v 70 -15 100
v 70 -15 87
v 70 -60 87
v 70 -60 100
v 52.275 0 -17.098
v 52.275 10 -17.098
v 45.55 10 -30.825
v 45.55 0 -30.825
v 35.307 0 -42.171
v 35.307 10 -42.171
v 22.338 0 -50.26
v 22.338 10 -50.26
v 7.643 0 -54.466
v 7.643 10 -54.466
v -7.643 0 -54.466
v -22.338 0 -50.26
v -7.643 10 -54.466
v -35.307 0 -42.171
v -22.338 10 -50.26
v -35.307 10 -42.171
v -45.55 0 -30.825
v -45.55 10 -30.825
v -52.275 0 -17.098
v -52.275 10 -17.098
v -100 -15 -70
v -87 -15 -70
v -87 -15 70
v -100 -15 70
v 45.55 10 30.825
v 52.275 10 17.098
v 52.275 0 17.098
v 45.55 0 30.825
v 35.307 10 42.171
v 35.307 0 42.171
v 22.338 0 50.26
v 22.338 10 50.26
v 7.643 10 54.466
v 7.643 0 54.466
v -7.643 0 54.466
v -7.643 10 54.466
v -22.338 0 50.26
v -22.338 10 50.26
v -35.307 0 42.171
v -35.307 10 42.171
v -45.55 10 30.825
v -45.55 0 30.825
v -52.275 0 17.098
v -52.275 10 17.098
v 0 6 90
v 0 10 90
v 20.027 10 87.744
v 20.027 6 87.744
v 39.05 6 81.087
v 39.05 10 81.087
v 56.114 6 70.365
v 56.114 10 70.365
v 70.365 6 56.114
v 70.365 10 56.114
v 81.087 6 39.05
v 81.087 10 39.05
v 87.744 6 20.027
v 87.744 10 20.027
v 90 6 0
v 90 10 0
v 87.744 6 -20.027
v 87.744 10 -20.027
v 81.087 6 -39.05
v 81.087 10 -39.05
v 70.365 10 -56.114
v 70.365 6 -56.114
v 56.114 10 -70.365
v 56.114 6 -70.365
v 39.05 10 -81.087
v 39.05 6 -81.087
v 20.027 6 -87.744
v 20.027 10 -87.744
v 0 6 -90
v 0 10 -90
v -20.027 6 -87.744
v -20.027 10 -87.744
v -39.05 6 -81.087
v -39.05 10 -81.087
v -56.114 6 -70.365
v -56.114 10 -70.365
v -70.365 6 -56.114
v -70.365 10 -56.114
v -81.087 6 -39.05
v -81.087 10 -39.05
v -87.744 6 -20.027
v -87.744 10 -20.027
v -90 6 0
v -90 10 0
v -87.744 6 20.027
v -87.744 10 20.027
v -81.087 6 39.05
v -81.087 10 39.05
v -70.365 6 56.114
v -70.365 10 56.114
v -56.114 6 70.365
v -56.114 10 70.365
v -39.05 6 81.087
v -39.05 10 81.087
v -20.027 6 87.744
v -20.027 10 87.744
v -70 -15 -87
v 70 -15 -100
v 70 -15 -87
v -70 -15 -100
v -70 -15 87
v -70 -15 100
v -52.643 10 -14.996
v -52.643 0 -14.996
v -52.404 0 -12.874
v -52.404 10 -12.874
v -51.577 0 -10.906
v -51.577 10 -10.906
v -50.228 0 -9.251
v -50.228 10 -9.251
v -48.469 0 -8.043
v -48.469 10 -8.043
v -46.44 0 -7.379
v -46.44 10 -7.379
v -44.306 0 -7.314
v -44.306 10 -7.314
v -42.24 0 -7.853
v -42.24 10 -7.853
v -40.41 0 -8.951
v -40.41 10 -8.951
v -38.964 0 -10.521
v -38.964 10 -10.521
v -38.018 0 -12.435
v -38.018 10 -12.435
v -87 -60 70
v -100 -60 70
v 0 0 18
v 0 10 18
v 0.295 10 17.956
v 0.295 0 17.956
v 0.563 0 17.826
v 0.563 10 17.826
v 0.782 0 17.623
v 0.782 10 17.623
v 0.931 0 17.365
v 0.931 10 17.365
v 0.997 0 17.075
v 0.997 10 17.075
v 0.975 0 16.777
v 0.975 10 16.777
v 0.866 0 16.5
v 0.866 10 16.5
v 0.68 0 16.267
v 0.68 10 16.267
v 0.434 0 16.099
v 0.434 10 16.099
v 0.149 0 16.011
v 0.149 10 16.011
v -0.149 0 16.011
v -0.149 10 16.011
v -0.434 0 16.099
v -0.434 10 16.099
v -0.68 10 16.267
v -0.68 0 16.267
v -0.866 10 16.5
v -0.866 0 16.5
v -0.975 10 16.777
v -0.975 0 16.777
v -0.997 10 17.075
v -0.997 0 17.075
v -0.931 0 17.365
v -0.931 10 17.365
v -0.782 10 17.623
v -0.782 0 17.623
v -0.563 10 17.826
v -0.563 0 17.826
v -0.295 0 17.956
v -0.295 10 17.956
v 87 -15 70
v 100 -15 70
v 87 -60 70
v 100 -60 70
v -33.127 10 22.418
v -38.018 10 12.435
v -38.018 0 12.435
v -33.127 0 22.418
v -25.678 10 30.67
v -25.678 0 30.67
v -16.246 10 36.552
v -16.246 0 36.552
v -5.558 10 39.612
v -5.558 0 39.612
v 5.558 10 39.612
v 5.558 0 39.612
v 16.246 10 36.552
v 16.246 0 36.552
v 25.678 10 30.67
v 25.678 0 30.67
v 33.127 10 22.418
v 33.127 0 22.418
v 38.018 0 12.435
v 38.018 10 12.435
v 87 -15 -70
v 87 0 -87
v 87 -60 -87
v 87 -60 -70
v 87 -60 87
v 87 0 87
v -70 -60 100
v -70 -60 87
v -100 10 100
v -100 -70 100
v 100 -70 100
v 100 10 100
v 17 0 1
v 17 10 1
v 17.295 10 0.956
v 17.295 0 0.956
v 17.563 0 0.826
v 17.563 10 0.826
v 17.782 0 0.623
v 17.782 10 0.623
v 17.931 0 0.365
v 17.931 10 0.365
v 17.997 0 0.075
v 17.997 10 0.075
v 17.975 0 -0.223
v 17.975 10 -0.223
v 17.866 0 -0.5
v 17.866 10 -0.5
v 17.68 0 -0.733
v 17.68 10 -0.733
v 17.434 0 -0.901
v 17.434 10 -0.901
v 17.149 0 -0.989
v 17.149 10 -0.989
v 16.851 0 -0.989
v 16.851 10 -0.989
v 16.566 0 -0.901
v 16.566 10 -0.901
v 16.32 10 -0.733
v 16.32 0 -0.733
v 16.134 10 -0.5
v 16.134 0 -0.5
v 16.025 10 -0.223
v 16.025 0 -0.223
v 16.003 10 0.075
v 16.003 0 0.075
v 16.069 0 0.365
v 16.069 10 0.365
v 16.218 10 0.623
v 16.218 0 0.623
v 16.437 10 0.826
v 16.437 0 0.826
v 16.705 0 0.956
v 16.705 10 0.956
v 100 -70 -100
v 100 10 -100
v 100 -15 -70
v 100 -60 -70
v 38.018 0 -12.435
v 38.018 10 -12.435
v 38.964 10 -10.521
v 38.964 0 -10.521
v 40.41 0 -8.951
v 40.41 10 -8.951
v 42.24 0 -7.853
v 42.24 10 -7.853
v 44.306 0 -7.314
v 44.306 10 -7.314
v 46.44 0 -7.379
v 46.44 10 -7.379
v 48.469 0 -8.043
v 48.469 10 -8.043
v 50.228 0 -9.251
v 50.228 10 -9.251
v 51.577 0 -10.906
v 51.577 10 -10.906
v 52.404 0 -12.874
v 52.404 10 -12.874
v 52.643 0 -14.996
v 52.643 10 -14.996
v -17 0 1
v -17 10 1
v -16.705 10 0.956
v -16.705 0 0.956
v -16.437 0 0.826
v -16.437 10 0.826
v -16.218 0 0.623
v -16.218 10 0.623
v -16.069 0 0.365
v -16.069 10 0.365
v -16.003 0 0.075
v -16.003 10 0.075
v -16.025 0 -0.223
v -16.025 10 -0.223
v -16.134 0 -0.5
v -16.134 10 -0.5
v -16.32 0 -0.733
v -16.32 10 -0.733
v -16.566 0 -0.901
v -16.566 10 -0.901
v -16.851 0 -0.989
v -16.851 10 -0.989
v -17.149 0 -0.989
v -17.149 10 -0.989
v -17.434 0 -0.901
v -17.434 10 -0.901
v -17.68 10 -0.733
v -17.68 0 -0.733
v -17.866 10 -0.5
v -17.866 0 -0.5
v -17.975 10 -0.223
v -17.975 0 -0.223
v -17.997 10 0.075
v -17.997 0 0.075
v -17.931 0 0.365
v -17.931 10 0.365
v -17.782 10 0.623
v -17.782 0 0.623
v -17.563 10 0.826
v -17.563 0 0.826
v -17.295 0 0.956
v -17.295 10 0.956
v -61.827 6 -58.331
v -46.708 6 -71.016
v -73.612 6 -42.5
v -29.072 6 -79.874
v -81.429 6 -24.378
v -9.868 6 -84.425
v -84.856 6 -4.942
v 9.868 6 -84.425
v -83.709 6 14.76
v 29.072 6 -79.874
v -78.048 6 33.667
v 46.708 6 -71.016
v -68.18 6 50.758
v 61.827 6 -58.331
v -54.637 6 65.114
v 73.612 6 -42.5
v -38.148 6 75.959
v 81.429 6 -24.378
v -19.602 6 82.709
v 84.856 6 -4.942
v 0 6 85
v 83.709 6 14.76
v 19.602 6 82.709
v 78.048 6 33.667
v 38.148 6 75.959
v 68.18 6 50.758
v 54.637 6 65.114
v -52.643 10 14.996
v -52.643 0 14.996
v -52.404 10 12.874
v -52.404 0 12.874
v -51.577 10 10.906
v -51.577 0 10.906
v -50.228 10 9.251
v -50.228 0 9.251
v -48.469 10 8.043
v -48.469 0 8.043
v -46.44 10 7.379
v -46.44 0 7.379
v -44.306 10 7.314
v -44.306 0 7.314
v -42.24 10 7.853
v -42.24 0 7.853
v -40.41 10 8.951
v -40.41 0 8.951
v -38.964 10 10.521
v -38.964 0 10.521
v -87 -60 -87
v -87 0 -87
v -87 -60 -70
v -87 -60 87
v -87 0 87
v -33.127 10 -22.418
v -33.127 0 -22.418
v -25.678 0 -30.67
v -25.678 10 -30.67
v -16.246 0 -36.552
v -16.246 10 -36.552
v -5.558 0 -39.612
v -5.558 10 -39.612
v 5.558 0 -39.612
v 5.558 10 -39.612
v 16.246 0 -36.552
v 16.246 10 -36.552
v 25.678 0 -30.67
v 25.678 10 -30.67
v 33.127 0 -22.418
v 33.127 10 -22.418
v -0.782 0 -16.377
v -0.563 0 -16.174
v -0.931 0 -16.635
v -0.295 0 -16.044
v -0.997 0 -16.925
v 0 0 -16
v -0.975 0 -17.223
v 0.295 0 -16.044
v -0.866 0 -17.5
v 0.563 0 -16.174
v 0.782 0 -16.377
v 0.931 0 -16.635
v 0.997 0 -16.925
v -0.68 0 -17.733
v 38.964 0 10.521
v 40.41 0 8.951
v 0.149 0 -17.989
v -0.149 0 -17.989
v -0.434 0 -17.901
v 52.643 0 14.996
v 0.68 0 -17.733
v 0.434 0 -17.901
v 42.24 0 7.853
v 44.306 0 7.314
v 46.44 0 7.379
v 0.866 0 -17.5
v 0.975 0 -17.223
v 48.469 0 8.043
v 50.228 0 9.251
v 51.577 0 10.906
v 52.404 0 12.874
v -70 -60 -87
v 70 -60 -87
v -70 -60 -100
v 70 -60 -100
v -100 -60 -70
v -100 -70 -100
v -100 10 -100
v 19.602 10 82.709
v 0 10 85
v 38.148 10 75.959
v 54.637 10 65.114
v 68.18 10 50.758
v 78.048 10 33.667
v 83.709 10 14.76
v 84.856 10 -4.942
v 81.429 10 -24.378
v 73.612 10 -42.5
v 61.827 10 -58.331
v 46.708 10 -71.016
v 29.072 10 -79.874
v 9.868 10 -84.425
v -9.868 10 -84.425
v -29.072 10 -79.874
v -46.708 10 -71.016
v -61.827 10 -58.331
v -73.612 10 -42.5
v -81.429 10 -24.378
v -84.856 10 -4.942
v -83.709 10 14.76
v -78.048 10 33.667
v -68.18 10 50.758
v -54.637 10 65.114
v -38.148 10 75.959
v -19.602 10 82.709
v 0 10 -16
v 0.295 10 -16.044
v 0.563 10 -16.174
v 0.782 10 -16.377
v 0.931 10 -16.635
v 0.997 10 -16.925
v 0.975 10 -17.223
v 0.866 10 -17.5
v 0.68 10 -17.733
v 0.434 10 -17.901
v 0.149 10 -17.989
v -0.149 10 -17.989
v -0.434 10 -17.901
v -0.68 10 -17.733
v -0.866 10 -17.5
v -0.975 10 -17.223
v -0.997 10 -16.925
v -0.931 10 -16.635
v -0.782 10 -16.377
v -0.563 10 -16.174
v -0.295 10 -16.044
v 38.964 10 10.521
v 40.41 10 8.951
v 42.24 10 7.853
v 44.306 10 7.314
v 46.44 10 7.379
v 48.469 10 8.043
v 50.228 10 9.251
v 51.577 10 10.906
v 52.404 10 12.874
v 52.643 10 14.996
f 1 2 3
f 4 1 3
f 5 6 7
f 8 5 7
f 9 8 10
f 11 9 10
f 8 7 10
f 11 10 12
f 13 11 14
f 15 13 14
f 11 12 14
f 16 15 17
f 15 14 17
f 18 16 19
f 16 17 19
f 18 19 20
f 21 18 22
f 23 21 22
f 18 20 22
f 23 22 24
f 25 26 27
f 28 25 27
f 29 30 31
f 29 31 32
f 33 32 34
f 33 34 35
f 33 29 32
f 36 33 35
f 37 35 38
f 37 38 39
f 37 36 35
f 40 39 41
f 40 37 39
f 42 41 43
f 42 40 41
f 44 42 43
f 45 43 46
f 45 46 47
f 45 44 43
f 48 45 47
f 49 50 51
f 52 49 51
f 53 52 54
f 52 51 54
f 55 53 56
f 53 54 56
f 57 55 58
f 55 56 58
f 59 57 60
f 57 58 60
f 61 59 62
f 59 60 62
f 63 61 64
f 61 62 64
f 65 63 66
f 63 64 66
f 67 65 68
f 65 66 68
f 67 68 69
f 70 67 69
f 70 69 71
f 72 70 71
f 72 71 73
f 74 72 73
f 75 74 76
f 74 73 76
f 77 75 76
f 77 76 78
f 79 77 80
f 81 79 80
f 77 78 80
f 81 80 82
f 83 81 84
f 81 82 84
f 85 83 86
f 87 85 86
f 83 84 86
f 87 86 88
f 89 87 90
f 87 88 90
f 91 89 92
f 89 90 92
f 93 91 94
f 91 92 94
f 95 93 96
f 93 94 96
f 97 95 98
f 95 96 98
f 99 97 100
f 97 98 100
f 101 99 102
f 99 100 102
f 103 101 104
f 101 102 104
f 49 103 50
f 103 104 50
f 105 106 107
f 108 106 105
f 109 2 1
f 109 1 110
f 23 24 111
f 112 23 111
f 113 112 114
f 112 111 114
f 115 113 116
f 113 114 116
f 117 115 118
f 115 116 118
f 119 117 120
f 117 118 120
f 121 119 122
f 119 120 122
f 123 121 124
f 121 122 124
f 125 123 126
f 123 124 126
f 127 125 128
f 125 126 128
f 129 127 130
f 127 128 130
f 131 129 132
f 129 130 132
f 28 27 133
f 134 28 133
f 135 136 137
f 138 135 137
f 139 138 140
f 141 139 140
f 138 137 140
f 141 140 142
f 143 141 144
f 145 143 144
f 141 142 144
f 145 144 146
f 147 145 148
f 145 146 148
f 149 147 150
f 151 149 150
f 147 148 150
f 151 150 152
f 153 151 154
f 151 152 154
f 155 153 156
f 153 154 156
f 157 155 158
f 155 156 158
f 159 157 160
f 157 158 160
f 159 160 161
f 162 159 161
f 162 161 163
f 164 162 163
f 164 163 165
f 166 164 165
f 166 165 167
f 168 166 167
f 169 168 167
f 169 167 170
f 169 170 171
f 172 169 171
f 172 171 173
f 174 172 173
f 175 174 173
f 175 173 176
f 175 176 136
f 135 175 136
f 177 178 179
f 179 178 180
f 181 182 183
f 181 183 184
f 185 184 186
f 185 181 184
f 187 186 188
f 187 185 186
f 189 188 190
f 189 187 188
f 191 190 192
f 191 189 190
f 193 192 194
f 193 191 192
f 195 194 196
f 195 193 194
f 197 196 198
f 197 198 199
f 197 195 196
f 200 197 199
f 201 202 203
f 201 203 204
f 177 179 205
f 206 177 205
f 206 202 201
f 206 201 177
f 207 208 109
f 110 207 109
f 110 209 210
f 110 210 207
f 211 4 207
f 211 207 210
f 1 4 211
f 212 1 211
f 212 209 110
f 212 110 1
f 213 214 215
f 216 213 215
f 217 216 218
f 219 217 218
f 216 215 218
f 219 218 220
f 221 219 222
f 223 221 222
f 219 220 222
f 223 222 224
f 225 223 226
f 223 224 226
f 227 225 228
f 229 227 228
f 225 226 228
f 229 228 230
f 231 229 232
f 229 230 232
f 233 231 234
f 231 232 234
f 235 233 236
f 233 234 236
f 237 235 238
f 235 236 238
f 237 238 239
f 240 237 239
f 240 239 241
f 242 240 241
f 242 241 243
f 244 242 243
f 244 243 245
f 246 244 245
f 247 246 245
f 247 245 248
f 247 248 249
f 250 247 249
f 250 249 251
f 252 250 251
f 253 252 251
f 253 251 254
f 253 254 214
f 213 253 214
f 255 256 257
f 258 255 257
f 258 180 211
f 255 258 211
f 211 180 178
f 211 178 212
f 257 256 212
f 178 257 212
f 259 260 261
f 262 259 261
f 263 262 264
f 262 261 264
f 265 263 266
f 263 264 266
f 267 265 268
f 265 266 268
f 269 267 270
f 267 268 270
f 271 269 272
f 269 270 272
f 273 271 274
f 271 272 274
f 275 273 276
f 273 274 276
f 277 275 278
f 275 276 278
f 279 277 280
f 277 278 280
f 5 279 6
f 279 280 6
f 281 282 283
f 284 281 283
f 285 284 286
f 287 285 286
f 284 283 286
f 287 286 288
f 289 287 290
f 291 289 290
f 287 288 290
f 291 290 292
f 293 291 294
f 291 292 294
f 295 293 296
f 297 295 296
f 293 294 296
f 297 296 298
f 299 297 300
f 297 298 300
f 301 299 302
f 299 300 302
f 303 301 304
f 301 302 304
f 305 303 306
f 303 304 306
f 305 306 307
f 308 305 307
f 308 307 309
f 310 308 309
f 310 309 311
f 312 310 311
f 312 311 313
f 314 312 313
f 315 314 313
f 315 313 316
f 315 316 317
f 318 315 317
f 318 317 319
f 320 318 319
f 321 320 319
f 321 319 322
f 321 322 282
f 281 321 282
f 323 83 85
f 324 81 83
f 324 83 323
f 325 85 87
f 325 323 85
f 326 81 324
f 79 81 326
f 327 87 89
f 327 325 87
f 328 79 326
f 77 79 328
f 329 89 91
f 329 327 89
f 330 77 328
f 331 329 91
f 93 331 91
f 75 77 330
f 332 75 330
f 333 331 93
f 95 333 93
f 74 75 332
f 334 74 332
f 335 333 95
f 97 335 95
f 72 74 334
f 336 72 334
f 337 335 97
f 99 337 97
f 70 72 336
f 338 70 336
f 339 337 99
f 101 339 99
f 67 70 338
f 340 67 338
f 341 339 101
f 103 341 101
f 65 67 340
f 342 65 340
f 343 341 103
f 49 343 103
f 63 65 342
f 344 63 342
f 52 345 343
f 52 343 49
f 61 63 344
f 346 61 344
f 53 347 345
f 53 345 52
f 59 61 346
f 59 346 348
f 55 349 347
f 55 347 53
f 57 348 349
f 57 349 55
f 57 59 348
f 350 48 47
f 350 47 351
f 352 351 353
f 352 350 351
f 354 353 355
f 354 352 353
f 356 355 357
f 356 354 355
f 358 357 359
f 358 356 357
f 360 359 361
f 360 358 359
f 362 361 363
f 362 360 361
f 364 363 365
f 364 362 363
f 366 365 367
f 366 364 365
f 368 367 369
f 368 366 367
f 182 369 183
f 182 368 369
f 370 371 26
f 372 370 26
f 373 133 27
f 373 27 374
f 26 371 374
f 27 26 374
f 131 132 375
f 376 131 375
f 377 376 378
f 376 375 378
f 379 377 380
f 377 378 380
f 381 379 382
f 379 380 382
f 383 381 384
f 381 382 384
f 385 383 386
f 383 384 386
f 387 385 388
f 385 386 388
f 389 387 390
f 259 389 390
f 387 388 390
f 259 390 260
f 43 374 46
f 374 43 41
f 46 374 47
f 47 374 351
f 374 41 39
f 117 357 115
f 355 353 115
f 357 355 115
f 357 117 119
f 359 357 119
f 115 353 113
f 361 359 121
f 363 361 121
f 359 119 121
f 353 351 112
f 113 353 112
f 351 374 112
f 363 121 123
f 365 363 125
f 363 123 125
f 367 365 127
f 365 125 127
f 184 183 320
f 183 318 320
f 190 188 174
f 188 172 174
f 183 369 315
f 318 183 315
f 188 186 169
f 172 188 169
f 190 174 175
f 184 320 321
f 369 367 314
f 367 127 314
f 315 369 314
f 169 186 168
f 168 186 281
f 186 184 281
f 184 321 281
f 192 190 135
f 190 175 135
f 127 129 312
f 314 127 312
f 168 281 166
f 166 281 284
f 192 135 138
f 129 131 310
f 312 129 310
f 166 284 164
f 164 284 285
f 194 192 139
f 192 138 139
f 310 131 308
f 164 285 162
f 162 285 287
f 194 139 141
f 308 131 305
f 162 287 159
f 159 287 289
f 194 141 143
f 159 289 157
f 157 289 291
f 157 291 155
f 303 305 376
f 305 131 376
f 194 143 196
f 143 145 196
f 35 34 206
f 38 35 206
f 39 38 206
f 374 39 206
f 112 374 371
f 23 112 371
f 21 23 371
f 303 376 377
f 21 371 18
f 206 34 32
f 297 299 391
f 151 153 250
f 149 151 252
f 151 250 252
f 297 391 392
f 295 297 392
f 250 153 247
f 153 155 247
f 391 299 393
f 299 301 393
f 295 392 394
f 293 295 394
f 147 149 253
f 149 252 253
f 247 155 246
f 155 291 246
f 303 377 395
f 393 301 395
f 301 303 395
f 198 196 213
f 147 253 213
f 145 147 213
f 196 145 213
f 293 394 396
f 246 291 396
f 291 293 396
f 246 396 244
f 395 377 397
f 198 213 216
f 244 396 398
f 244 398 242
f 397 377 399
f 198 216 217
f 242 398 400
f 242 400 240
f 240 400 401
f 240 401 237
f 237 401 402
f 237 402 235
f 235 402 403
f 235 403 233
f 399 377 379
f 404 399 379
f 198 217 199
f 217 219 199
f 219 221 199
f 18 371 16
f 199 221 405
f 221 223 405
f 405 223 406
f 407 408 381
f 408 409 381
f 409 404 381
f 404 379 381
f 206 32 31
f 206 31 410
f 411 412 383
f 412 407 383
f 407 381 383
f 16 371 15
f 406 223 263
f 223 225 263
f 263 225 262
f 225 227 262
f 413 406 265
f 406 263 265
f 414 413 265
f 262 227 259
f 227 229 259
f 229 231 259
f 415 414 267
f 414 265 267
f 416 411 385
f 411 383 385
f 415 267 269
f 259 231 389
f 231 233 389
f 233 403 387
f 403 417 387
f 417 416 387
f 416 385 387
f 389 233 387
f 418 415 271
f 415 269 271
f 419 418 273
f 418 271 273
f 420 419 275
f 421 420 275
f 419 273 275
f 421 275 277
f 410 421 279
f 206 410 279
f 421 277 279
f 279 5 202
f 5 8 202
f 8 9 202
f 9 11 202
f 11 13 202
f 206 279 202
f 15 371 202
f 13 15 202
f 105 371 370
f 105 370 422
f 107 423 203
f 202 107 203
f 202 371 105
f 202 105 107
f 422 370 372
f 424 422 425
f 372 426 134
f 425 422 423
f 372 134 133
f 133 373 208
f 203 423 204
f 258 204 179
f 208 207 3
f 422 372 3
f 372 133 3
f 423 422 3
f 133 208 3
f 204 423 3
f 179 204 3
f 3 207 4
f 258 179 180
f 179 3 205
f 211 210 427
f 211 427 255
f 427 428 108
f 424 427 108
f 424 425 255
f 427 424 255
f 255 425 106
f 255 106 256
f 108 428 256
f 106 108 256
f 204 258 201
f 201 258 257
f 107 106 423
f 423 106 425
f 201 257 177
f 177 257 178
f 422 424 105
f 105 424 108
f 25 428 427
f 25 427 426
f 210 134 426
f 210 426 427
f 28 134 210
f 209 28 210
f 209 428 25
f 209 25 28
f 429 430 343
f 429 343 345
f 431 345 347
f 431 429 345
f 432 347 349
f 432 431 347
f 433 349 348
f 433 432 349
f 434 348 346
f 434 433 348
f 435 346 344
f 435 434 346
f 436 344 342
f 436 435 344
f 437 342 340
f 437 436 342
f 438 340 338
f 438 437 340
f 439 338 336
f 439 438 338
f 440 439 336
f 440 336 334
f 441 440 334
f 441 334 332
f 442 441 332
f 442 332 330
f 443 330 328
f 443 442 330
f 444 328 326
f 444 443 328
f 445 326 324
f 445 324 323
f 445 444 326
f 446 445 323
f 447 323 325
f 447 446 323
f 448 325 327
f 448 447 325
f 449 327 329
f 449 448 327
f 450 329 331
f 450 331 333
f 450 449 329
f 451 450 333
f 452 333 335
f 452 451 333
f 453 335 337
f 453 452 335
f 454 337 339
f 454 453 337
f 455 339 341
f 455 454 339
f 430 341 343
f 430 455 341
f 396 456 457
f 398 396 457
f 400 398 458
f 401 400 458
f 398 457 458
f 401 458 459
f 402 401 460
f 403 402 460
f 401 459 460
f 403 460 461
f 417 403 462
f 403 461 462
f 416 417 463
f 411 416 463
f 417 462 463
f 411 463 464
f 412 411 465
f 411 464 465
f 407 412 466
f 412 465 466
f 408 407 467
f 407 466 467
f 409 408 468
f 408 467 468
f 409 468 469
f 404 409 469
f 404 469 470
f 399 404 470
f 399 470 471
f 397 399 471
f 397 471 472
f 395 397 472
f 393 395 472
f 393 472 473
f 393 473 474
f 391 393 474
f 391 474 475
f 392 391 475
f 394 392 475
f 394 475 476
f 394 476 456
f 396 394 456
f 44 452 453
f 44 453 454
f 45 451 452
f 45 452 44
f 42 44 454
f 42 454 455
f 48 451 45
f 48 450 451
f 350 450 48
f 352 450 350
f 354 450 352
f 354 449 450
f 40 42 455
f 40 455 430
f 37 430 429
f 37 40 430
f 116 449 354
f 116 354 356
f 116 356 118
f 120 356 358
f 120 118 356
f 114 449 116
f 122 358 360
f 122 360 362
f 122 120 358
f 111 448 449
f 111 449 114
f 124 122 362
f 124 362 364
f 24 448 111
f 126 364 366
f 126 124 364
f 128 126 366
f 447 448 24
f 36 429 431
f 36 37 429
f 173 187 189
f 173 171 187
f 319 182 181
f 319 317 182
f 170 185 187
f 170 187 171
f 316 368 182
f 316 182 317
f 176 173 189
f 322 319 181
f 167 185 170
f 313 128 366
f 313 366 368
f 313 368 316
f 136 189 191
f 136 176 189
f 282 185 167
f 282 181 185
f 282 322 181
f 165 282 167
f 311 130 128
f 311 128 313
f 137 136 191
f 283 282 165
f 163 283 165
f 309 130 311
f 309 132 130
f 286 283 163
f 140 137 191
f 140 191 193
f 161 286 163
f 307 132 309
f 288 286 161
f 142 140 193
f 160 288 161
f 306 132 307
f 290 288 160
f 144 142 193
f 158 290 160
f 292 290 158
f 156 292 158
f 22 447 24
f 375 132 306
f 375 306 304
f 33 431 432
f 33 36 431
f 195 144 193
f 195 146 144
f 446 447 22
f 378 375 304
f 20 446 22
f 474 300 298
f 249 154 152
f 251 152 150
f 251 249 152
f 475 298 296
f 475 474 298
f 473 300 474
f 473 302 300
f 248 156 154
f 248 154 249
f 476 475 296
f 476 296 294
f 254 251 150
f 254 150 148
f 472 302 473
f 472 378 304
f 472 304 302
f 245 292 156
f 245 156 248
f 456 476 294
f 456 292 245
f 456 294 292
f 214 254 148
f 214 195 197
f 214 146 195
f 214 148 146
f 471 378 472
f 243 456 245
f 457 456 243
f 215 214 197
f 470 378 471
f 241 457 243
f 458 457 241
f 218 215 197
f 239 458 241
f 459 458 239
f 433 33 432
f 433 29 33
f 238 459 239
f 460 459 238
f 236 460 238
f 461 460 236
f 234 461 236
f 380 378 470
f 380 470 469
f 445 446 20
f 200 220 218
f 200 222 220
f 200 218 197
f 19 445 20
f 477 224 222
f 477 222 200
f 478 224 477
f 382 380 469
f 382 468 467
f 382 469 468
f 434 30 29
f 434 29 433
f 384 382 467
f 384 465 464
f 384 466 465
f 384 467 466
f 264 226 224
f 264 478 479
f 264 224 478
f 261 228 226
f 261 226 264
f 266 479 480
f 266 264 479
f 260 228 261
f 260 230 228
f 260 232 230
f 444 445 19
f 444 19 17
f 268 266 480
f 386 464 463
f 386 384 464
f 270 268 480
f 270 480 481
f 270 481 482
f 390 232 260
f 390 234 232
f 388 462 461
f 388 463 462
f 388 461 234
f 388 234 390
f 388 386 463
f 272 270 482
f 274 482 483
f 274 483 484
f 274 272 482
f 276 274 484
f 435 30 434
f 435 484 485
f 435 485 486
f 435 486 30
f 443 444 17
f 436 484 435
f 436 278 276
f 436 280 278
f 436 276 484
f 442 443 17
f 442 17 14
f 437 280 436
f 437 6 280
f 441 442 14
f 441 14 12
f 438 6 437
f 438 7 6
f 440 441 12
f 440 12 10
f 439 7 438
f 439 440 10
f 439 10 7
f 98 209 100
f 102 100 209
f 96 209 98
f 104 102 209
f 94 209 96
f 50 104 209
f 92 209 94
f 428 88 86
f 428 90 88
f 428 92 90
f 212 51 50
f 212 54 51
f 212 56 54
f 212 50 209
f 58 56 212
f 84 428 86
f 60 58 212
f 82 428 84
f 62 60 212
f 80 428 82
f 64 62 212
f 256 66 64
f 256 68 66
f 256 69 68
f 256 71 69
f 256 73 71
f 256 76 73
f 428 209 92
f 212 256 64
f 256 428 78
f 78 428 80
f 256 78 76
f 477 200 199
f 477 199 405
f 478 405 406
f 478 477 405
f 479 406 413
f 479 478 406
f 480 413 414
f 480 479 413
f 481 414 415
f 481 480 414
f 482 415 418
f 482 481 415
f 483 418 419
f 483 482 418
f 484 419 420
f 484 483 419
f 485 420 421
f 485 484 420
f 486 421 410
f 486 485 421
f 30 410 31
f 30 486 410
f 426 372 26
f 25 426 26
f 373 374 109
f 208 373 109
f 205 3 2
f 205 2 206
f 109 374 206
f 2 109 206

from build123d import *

# Parameters (mm, degrees)
SKETCH2_W                = 200
SKETCH2_H                = 200
BOSS_EXTRUDE1_DEPTH      = 10
SKETCH12_R               = 90
SKETCH12_R_2             = 85
CUT_EXTRUDE8_DEPTH       = 4
SKETCH13_R               = 1
CUT_EXTRUDE9_DEPTH       = 142.774468788
SKETCH4_W                = 200
SKETCH4_H                = 200
SKETCH4_W_2              = 174
SKETCH4_H_2              = 174
BOSS_EXTRUDE4_DEPTH      = 60
CUT_EXTRUDE10_DEPTH      = 232.516738056
CUT_EXTRUDE10_DEPTH_BACK = 232.516738056
CUT_EXTRUDE11_DEPTH      = 232.516738056
CUT_EXTRUDE11_DEPTH_BACK = 232.516738056
CUT_EXTRUDE12_DEPTH      = 10
SKETCH19_W               = 200
SKETCH19_H               = 200
BOSS_EXTRUDE5_DEPTH      = 10


with BuildPart() as part:
    # Sketch2 → Boss-Extrude1 (new body)
    with BuildSketch(Plane(origin=(0, 0, 0), x_dir=(1, 0, 0), z_dir=(0, 1, 0))):
        Rectangle(SKETCH2_W, SKETCH2_H)
    extrude(amount=BOSS_EXTRUDE1_DEPTH)

    # Sketch12 → Cut-Extrude8 (cut)
    with BuildSketch(Plane(origin=(0, 10, 0), x_dir=(1, 0, 0), z_dir=(0, 1, 0))):
        with Locations(Location((0, 0, 0), (0, 0, 270))):
            Circle(SKETCH12_R)
        with Locations(Location((0, 0, 0), (0, 0, 270))):
            Circle(SKETCH12_R_2, mode=Mode.SUBTRACT)
    extrude(amount=-CUT_EXTRUDE8_DEPTH, mode=Mode.SUBTRACT)

    # Sketch13 → Cut-Extrude9 (cut, through all)
    with BuildSketch(Plane(origin=(0, 10, 0), x_dir=(1, 0, 0), z_dir=(0, 1, 0))):
        with Locations(Location((0, 17, 0), (0, 0, 270))):
            Circle(SKETCH13_R)
        with Locations(Location((17, 0, 0), (0, 0, 270))):
            Circle(SKETCH13_R)
        with Locations(Location((0, -17, 0), (0, 0, 270))):
            Circle(SKETCH13_R)
        with Locations(Location((-17, 0, 0), (0, 0, 270))):
            Circle(SKETCH13_R)
    extrude(amount=-CUT_EXTRUDE9_DEPTH, mode=Mode.SUBTRACT)

    # Sketch4 → Boss-Extrude4 (add)
    with BuildSketch(Plane.XZ):
        Rectangle(SKETCH4_W, SKETCH4_H)
        Rectangle(SKETCH4_W_2, SKETCH4_H_2, mode=Mode.SUBTRACT)
    extrude(amount=BOSS_EXTRUDE4_DEPTH)

    # Sketch14 → Cut-Extrude10 (cut, two sides: drawn at the far end of the back side and taken through both)
    with BuildSketch(Plane.XY.offset(100).offset(-CUT_EXTRUDE10_DEPTH_BACK)):
        Polygon((0, -15), (70, -15), (70, -60), (-70, -60), (-70, -15), align=None)
    extrude(amount=CUT_EXTRUDE10_DEPTH + CUT_EXTRUDE10_DEPTH_BACK, mode=Mode.SUBTRACT)

    # Sketch15 → Cut-Extrude11 (cut, two sides: drawn at the far end of the back side and taken through both)
    with BuildSketch(Plane.ZY.offset(100).offset(-CUT_EXTRUDE11_DEPTH_BACK)):
        Polygon((0, -60), (-70, -60), (-70, -15), (70, -15), (70, -60), align=None)
    extrude(amount=CUT_EXTRUDE11_DEPTH + CUT_EXTRUDE11_DEPTH_BACK, mode=Mode.SUBTRACT)

    # Sketch3 → Cut-Extrude12 (cut)
    with BuildSketch(Plane(origin=(0, 10, 0), x_dir=(1, 0, 0), z_dir=(0, 1, 0))):
        with BuildLine():
            ThreePointArc((-38.01797101, -12.435187183), (0, -40), (38.01797101, -12.435187183))
            ThreePointArc((38.01797101, -12.435187183), (47.477938171, -7.638415216), (52.274710139, -17.098382377))
            ThreePointArc((52.274710139, -17.098382377), (0, -55), (-52.274710139, -17.098382377))
            ThreePointArc((-52.274710139, -17.098382377), (-47.477938171, -7.638415216), (-38.01797101, -12.435187183))
        make_face()
        with BuildLine():
            ThreePointArc((38.01797101, 12.435187183), (47.477938171, 7.638415216), (52.274710139, 17.098382377))
            ThreePointArc((52.274710139, 17.098382377), (0, 55), (-52.274710139, 17.098382377))
            ThreePointArc((-52.274710139, 17.098382377), (-47.477938171, 7.638415216), (-38.01797101, 12.435187183))
            ThreePointArc((-38.01797101, 12.435187183), (0, 40), (38.01797101, 12.435187183))
        make_face()
    extrude(amount=-CUT_EXTRUDE12_DEPTH, mode=Mode.SUBTRACT)

    # Sketch19 → Boss-Extrude5 (add)
    with BuildSketch(Plane.XZ.offset(60)):
        Rectangle(SKETCH19_W, SKETCH19_H)
    extrude(amount=BOSS_EXTRUDE5_DEPTH)


solid = part.part
